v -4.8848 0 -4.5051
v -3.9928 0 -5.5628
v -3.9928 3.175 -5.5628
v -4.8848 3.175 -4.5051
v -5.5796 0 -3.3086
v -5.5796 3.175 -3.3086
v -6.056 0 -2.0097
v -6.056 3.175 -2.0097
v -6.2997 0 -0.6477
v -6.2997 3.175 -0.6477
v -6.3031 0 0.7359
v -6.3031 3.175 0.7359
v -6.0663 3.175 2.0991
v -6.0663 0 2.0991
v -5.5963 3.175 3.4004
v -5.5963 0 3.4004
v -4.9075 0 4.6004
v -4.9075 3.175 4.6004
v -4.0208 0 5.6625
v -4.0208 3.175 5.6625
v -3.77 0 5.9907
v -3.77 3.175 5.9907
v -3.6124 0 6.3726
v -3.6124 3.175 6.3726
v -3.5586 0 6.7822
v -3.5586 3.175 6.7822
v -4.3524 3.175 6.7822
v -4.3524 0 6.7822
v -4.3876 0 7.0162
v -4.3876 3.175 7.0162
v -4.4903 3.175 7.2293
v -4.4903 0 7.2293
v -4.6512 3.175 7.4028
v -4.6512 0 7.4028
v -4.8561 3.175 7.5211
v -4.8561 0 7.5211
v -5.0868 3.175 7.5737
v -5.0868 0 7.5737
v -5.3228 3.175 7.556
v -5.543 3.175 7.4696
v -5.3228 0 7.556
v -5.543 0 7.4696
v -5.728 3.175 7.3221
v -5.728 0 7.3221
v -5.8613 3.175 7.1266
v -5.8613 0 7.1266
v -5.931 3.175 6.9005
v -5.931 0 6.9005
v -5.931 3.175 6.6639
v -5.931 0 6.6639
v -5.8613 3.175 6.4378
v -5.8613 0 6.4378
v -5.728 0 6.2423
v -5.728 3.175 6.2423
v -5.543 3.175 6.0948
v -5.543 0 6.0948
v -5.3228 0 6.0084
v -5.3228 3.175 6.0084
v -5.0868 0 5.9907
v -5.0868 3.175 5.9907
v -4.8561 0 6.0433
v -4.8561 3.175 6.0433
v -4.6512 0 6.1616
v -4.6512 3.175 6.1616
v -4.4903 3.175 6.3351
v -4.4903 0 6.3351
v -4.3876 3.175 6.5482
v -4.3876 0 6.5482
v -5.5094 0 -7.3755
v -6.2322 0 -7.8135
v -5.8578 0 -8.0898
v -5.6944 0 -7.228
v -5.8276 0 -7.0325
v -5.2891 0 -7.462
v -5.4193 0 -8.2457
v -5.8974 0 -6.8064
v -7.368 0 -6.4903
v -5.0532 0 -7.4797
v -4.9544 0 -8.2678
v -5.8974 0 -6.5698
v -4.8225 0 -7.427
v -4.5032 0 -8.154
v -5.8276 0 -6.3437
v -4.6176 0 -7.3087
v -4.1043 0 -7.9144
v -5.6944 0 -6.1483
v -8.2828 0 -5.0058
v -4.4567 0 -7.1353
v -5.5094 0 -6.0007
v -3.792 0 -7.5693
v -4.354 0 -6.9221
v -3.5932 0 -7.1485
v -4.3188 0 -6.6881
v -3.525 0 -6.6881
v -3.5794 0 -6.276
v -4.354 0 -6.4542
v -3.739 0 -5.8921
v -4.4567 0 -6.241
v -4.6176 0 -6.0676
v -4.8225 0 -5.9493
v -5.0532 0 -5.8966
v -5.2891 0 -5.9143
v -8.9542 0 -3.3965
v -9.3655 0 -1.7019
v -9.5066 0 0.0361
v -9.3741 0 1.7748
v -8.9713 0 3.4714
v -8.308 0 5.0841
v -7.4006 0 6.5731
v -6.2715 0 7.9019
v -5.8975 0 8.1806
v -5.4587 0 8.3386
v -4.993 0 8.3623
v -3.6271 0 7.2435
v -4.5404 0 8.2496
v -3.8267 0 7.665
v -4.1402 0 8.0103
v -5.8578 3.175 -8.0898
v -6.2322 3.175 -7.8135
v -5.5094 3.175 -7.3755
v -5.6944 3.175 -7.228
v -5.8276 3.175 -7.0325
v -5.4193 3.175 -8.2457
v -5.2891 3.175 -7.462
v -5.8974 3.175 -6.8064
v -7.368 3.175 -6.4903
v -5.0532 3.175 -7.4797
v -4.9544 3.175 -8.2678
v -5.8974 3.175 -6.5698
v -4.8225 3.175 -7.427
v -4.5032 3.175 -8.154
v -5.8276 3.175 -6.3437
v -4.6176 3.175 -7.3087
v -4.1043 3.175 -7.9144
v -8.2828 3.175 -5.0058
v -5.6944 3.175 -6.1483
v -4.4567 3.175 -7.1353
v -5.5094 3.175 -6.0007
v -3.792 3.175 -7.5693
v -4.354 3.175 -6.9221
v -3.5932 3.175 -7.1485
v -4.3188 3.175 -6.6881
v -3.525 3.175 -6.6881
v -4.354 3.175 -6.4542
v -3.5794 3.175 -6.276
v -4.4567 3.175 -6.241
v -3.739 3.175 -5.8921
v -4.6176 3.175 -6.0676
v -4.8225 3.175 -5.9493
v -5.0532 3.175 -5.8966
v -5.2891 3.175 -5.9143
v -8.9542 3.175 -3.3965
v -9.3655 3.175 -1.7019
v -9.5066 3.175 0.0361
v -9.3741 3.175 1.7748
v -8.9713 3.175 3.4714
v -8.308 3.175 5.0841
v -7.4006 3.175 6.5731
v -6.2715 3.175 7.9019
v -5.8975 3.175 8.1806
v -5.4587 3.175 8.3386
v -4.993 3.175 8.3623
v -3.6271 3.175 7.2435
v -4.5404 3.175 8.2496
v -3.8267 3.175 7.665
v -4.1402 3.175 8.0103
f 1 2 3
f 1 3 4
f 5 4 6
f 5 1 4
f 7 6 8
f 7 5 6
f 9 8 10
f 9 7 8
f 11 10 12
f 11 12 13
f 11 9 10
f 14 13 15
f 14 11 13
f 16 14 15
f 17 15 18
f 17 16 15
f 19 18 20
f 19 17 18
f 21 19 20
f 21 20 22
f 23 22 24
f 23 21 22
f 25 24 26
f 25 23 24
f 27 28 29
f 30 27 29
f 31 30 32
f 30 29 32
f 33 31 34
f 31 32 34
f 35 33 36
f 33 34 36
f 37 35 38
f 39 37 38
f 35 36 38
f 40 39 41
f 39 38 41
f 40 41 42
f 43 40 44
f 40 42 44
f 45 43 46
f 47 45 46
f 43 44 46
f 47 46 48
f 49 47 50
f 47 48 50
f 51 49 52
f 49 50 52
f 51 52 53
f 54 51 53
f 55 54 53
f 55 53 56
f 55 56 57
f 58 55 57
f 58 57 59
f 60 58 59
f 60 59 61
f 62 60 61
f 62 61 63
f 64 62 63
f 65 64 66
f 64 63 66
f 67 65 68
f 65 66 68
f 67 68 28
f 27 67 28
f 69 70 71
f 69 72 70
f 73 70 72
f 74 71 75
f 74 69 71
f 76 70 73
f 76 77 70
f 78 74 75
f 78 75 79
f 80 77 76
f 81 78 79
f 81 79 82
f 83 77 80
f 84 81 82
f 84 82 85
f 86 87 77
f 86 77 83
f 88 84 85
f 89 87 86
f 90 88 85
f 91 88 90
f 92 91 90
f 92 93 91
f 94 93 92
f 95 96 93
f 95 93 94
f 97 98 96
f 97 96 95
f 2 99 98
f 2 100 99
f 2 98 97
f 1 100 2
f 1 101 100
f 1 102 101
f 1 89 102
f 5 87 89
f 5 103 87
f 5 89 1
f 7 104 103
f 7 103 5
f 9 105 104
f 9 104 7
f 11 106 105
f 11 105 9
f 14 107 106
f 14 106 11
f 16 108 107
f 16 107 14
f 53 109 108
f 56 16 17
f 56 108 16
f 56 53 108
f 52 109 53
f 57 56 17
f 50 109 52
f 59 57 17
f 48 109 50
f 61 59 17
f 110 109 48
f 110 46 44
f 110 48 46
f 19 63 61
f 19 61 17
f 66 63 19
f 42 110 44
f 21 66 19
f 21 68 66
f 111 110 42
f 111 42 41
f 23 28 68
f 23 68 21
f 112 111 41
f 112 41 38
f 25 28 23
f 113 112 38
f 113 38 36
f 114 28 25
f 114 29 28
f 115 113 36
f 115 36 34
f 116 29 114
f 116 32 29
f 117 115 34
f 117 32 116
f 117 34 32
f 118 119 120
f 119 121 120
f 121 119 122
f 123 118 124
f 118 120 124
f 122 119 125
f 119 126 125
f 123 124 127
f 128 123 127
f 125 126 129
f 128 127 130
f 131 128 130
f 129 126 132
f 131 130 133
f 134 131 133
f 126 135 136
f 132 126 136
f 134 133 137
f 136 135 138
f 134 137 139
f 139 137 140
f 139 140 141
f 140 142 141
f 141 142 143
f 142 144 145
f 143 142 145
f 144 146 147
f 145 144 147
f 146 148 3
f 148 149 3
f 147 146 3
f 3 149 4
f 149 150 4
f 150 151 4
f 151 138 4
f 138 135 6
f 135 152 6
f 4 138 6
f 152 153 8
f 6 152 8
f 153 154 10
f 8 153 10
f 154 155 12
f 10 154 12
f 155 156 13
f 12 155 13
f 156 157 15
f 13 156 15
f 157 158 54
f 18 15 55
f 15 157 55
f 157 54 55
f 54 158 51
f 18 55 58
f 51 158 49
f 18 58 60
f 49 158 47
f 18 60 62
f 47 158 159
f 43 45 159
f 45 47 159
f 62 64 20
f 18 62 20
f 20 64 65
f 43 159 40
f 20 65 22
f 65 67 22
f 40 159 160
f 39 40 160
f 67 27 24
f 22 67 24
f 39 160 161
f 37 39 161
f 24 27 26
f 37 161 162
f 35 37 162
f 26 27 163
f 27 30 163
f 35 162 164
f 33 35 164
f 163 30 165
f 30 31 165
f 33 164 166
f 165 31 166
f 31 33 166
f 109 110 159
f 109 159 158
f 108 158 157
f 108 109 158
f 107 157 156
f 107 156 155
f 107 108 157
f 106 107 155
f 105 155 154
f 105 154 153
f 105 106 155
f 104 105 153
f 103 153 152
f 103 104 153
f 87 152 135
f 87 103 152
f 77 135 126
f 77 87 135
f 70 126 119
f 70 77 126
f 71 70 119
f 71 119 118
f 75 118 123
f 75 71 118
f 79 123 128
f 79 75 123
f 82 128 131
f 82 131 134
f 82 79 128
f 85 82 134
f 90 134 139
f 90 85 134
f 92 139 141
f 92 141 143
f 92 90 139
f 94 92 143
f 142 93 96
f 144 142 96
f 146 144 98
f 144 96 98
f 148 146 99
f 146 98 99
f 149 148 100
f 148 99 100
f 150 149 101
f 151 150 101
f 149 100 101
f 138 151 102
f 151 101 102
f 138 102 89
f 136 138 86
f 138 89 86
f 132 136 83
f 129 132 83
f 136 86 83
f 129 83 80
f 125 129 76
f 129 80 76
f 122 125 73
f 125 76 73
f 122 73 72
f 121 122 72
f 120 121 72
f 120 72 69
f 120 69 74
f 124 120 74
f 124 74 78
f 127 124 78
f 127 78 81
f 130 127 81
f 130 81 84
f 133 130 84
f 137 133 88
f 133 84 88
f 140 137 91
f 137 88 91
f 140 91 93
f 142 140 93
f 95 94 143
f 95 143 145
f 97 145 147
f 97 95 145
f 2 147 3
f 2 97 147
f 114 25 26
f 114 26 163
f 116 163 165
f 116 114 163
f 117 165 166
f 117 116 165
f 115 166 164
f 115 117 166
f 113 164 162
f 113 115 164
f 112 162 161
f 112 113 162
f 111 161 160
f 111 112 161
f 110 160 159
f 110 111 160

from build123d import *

# Parameters (mm, degrees)
F0_R     = 0.79375
F1_DEPTH = 3.175


with BuildPart() as f1:
    # F0 (on Front) → F1 (new body)
    with BuildSketch(Plane.XZ):
        with BuildLine():
            ThreePointArc((-3.9927783848, -5.5628118829), (-6.3316194647, 0.0440282554), (-4.0207951612, 5.6624733224))
            ThreePointArc((-4.0207951612, 5.6624733224), (-6.2658522276, 5.6568699137), (-6.2714555786, 7.9019269802))
            ThreePointArc((-6.2714555786, 7.9019269802), (-9.5066095757, 0.0361038994), (-6.2322320705, -7.8134722725))
            ThreePointArc((-6.2322320705, -7.8134722725), (-6.2378353965, -5.5684152606), (-3.9927783848, -5.5628118829))
        make_face()
        with BuildLine():
            ThreePointArc((-6.2714555786, 7.9019269802), (-6.2658522276, 5.6568699137), (-4.0207951612, 5.6624733224))
            ThreePointArc((-4.0207951612, 5.6624733224), (-3.6787096426, 6.176520959), (-3.5586253987, 6.7822001224))
            ThreePointArc((-3.5586253987, 6.7822001224), (-4.5404461975, 8.2496158629), (-6.2714555786, 7.9019269802))
        make_face()
        with Locations((-5.1461253987, 6.7822001224)):
            Circle(F0_R, mode=Mode.SUBTRACT)
        with BuildLine():
            ThreePointArc((-3.5250052017, -6.6881421035), (-3.6466057216, -6.0788023263), (-3.9927783848, -5.5628118829))
            ThreePointArc((-3.9927783848, -5.5628118829), (-6.2378353965, -5.5684152606), (-6.2322320705, -7.8134722725))
            ThreePointArc((-6.2322320705, -7.8134722725), (-4.5031654583, -8.1540415977), (-3.5250052017, -6.6881421035))
        make_face()
        with Locations((-5.1125052017, -6.6881421035)):
            Circle(F0_R, mode=Mode.SUBTRACT)
    extrude(amount=-F1_DEPTH)


solid = f1.part
